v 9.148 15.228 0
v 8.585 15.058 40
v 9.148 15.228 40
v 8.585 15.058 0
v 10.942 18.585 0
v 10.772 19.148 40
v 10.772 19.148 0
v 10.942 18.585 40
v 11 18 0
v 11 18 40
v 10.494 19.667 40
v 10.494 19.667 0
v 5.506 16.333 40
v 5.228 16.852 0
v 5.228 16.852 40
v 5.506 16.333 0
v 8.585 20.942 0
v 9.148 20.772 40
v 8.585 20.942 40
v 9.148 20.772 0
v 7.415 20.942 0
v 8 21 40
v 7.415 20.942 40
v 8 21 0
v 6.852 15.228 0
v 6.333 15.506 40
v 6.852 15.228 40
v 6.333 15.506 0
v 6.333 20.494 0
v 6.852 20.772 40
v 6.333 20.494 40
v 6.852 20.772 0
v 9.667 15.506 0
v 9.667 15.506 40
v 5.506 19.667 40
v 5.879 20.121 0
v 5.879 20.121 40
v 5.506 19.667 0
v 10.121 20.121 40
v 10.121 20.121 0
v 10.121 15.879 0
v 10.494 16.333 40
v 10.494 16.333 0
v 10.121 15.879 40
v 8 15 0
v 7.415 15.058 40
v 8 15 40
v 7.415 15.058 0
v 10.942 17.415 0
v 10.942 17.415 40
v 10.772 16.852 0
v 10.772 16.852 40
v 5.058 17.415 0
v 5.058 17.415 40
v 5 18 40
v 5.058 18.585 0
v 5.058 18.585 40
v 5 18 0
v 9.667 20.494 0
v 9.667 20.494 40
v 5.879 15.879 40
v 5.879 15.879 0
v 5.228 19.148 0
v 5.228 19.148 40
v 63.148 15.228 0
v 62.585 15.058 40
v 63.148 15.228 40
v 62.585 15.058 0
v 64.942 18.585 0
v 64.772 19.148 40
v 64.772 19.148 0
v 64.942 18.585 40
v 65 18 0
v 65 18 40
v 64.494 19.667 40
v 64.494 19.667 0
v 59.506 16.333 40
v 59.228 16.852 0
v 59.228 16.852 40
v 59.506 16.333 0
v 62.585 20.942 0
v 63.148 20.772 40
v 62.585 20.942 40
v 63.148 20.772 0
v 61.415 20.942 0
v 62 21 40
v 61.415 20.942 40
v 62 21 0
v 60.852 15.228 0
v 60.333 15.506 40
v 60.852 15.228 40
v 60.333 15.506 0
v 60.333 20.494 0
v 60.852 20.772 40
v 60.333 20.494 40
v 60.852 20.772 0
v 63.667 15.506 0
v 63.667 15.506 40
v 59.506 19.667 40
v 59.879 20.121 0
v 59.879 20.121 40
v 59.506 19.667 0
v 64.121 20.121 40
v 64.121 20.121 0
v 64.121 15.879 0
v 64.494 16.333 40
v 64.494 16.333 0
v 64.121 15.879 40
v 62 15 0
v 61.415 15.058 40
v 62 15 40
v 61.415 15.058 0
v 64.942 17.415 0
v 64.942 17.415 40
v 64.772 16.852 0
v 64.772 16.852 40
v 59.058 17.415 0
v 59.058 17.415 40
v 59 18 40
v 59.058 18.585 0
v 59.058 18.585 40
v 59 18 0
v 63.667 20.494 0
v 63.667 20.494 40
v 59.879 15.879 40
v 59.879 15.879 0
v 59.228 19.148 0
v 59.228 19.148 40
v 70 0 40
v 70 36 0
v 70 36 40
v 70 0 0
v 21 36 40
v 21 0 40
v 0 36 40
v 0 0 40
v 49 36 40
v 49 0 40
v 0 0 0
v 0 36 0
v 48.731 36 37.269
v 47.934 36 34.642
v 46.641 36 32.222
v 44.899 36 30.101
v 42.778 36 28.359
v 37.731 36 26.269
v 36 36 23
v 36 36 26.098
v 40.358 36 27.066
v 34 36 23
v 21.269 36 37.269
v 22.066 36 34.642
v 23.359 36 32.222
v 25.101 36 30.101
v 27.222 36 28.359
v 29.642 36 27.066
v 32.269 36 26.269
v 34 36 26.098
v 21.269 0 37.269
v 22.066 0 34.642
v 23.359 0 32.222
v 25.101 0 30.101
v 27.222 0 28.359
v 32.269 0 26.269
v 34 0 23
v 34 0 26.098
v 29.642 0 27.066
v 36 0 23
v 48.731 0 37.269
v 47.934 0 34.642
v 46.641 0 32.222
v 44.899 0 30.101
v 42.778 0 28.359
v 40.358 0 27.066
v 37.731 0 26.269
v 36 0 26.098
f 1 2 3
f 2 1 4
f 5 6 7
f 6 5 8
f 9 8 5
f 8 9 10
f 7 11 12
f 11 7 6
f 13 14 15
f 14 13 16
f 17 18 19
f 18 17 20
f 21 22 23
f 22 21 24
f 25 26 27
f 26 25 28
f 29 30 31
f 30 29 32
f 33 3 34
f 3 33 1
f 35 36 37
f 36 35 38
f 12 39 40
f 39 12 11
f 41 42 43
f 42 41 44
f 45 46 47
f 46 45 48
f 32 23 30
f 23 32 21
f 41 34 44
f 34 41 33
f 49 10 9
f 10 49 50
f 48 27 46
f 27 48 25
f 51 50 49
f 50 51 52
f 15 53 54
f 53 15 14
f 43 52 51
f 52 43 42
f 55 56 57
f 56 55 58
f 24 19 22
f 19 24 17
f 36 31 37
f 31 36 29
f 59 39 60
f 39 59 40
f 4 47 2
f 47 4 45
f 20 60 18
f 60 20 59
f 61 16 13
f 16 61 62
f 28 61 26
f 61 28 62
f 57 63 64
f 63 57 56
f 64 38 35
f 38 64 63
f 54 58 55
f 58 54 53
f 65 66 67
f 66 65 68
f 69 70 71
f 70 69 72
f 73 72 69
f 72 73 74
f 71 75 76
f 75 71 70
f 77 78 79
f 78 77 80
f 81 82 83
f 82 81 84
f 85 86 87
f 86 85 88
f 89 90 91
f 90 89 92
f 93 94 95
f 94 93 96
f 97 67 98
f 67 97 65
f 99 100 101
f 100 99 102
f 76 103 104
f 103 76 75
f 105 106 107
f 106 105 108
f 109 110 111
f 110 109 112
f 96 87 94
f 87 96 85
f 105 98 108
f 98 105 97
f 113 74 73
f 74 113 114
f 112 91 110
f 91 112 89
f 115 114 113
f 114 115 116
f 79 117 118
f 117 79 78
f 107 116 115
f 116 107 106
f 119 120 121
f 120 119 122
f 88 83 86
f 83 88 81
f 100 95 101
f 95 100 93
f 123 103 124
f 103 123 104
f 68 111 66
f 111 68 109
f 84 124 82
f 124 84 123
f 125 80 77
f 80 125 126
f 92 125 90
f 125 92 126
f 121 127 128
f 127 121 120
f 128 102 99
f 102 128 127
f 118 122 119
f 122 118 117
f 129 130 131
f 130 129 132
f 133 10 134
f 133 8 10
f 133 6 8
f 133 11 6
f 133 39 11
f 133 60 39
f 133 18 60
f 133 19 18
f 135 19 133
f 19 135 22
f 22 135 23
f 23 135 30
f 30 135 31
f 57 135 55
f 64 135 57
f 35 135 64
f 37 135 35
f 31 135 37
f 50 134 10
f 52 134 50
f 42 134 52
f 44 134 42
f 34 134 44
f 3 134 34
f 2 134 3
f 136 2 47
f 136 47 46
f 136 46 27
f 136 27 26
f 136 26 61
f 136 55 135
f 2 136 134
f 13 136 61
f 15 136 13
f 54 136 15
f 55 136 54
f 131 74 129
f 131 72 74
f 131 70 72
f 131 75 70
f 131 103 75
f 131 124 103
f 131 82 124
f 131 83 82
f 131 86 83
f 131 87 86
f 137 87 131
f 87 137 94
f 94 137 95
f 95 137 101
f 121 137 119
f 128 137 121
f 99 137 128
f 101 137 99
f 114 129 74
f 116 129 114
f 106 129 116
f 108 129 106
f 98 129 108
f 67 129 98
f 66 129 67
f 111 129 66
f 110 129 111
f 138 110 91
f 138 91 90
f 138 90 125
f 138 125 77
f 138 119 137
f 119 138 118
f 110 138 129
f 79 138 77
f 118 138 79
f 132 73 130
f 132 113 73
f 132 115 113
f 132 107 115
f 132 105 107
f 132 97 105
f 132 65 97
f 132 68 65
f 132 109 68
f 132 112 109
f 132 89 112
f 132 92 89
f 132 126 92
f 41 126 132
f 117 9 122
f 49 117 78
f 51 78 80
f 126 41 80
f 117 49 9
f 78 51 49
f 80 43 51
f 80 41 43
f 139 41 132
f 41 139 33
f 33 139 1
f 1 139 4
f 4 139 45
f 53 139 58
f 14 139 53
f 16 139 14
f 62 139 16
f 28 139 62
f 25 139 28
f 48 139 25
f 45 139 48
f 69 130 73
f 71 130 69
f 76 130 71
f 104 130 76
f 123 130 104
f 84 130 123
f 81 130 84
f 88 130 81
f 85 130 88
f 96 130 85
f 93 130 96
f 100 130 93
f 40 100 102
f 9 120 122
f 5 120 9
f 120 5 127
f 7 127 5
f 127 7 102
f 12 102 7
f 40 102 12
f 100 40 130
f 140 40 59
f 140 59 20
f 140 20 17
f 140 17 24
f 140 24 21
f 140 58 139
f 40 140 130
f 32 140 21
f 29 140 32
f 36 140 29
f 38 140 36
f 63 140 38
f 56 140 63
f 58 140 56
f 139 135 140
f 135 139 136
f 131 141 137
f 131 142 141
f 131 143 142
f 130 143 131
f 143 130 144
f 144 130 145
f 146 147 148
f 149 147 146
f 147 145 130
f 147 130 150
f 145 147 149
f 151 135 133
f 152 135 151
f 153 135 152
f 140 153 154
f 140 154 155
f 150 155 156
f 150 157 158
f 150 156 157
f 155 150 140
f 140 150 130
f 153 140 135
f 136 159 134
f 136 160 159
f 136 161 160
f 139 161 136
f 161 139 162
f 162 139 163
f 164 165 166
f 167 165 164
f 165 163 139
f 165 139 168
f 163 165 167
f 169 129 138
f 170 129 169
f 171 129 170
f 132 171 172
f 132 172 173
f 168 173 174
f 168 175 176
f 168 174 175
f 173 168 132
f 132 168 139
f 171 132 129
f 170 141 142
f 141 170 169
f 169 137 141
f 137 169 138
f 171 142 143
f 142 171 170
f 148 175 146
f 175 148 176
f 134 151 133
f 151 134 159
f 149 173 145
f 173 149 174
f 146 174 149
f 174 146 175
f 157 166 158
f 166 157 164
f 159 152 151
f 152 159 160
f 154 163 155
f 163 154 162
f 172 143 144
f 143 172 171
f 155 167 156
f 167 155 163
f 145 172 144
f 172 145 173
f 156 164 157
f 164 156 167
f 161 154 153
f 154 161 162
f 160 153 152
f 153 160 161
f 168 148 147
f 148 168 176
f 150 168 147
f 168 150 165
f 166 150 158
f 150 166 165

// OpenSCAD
$fn = 32;

// ----------------------------------------------------------------------
// Saddle clamp: split shaft clamp
// ----------------------------------------------------------------------

// --- parameters (mm) ---
blk_l = 70;               // block length, X
blk_w = 36;               // block width, Y
blk_h = 40;               // block height
clamp_r = 14;             // shaft groove radius
hole_r = 3;               // bolt hole radius
hole_m = 8;               // bolt hole margin from the ends
saw_w = 2;                // saw kerf width

saw_depth = clamp_r + 3;  // saw kerf depth

difference() {
  cube([blk_l, blk_w, blk_h]);
  translate([blk_l / 2, -1, blk_h])
    rotate([-90, 0, 0])
      cylinder(h = blk_w + 2, r = clamp_r);
  for (sx = [0, 1])
    translate([sx ? blk_l - hole_m : hole_m, blk_w / 2, -1])
      cylinder(r = hole_r, h = blk_h + 2);
  translate([blk_l / 2 - saw_w / 2, -1, blk_h - saw_depth])
    cube([saw_w, blk_w + 2, saw_depth + 1]);
}
